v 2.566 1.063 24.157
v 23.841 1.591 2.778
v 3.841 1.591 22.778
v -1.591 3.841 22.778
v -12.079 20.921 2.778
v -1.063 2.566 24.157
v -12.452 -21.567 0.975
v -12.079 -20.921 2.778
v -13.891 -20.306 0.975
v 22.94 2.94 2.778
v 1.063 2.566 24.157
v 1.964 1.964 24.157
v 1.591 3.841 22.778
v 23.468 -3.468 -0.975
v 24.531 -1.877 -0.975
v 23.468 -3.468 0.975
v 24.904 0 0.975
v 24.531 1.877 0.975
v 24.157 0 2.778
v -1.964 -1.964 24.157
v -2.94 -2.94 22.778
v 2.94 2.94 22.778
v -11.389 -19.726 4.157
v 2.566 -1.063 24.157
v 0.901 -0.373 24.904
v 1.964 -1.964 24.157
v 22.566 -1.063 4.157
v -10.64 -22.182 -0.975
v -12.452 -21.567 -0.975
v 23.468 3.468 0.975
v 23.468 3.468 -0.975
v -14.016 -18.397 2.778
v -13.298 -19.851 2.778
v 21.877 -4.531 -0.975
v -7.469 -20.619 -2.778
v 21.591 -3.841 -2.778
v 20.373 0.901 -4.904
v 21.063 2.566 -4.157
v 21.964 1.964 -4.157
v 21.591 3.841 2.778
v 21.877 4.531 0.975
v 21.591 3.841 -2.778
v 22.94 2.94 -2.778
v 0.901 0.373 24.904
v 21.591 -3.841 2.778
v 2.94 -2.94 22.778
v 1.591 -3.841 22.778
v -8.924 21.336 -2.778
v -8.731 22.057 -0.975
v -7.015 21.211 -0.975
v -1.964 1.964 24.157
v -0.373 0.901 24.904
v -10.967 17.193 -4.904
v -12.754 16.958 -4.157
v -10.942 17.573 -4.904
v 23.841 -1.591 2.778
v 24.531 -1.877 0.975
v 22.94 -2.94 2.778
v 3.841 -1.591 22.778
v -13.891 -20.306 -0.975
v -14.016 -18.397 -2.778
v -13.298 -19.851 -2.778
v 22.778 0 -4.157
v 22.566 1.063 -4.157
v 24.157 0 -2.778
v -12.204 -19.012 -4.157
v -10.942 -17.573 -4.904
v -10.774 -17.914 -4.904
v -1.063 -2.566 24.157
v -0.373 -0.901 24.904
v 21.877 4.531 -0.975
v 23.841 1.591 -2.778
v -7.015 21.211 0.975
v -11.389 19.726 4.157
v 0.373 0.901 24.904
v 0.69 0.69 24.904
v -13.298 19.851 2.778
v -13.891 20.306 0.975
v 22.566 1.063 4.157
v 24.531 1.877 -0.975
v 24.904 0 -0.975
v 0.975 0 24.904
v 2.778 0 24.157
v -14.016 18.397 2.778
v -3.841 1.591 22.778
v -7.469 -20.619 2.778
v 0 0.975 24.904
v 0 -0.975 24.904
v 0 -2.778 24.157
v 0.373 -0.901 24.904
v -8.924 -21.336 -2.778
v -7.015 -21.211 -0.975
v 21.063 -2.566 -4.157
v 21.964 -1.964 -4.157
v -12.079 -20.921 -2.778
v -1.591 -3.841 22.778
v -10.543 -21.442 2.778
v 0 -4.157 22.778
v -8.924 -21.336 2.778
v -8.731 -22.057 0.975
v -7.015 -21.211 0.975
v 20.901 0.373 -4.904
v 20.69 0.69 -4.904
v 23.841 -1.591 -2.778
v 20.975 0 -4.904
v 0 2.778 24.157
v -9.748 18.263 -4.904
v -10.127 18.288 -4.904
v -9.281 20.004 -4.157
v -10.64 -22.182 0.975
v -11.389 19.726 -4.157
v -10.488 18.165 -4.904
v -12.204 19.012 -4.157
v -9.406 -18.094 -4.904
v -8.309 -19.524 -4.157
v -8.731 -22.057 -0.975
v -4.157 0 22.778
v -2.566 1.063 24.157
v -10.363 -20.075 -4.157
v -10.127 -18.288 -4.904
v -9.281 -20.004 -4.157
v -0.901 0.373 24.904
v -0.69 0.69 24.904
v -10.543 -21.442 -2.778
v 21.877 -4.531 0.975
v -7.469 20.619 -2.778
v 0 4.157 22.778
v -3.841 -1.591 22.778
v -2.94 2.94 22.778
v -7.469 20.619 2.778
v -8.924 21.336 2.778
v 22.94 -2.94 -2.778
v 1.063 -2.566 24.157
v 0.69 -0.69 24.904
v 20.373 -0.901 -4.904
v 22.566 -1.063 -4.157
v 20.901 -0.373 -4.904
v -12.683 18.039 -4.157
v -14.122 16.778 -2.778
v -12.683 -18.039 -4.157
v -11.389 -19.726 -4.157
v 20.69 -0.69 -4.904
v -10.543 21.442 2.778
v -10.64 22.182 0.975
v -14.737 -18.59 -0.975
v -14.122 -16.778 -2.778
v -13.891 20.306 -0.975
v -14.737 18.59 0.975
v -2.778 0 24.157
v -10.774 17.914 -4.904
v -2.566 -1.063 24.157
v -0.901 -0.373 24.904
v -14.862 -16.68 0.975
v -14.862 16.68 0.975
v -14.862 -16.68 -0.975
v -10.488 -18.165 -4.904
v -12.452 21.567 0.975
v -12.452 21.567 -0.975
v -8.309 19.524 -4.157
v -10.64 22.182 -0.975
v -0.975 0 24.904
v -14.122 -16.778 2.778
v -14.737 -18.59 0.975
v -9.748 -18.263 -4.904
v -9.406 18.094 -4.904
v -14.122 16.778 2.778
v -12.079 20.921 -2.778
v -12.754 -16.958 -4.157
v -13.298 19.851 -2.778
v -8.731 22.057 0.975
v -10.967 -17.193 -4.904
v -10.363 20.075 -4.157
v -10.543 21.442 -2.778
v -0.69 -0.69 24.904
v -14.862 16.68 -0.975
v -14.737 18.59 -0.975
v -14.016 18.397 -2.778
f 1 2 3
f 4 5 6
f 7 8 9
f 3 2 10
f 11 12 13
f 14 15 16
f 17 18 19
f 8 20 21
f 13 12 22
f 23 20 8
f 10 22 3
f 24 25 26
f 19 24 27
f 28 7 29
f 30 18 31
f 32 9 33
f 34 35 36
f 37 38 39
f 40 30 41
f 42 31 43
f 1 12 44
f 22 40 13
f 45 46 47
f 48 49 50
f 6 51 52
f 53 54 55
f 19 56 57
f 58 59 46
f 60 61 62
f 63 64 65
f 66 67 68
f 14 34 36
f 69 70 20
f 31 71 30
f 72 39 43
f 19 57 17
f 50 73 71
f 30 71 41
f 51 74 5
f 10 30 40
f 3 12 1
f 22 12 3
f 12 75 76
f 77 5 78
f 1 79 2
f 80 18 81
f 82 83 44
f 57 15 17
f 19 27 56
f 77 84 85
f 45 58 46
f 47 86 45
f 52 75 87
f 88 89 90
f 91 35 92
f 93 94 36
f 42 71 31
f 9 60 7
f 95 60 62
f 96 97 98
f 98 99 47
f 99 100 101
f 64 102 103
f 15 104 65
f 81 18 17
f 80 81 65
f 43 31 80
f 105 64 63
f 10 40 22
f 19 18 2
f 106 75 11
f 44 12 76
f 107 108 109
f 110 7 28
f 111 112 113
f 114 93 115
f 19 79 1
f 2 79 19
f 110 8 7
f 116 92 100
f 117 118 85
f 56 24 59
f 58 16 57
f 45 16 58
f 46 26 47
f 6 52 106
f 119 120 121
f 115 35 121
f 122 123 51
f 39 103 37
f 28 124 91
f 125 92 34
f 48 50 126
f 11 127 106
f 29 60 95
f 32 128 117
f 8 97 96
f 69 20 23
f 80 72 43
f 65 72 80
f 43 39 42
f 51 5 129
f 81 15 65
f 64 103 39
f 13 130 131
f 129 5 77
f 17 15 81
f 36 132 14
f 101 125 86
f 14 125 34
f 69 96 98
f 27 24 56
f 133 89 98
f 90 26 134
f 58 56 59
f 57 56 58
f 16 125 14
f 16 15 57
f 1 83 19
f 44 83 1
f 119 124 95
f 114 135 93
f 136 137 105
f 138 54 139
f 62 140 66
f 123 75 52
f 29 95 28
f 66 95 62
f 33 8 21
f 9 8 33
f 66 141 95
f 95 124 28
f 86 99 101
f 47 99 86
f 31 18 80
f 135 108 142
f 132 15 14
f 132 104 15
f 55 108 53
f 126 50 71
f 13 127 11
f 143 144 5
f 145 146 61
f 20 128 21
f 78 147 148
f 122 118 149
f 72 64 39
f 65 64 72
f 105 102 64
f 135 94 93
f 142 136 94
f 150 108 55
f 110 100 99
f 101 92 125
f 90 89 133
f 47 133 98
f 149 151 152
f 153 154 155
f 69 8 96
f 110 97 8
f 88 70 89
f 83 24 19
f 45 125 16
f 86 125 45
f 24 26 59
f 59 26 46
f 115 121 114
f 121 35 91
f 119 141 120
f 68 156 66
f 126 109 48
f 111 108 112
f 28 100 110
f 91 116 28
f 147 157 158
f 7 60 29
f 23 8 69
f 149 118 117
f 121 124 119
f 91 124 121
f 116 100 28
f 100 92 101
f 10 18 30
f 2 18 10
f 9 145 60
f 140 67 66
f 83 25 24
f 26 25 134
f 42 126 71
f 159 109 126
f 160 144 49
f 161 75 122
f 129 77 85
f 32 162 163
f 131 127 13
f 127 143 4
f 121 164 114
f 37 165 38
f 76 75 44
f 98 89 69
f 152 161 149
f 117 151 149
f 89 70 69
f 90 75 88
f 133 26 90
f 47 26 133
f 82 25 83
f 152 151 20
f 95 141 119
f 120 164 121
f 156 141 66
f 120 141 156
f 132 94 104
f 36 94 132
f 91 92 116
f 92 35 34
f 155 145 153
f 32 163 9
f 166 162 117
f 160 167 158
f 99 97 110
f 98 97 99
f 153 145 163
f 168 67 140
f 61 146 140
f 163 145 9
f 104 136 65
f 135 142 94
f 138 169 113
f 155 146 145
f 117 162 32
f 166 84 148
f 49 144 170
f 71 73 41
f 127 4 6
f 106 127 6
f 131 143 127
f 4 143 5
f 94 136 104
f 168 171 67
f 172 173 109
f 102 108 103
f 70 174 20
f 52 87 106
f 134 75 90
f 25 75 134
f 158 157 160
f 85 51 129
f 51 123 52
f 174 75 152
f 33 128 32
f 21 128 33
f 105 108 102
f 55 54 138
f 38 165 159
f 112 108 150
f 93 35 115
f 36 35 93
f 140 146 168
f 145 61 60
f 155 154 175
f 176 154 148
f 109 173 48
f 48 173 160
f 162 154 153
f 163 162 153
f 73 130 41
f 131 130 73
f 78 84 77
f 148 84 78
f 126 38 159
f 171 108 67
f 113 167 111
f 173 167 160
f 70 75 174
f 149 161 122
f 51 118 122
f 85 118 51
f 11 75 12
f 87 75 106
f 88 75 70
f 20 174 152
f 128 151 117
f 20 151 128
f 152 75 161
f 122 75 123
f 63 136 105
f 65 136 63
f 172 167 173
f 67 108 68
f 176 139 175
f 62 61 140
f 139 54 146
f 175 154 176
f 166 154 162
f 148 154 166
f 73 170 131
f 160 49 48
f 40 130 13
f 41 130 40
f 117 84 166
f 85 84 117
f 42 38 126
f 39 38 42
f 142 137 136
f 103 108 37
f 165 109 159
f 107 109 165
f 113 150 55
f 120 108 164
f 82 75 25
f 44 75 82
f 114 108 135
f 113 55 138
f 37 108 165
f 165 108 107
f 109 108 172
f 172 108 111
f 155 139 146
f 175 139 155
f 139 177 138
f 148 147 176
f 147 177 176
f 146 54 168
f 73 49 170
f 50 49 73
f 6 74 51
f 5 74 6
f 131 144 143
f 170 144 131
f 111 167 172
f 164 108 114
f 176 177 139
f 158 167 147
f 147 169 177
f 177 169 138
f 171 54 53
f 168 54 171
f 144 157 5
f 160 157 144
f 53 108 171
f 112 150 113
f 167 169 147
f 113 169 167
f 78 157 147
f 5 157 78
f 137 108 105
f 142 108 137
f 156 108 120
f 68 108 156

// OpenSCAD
hull() {
    rotate([0,0,0]) translate([20,0, 0]) sphere(5);
    rotate([0,0,120]) translate([20,0, 0])  sphere(5);
    rotate([0,0,240]) translate([20,0, 0]) sphere(5);
    translate([ 0, 0,20]) sphere(5);
}
    
